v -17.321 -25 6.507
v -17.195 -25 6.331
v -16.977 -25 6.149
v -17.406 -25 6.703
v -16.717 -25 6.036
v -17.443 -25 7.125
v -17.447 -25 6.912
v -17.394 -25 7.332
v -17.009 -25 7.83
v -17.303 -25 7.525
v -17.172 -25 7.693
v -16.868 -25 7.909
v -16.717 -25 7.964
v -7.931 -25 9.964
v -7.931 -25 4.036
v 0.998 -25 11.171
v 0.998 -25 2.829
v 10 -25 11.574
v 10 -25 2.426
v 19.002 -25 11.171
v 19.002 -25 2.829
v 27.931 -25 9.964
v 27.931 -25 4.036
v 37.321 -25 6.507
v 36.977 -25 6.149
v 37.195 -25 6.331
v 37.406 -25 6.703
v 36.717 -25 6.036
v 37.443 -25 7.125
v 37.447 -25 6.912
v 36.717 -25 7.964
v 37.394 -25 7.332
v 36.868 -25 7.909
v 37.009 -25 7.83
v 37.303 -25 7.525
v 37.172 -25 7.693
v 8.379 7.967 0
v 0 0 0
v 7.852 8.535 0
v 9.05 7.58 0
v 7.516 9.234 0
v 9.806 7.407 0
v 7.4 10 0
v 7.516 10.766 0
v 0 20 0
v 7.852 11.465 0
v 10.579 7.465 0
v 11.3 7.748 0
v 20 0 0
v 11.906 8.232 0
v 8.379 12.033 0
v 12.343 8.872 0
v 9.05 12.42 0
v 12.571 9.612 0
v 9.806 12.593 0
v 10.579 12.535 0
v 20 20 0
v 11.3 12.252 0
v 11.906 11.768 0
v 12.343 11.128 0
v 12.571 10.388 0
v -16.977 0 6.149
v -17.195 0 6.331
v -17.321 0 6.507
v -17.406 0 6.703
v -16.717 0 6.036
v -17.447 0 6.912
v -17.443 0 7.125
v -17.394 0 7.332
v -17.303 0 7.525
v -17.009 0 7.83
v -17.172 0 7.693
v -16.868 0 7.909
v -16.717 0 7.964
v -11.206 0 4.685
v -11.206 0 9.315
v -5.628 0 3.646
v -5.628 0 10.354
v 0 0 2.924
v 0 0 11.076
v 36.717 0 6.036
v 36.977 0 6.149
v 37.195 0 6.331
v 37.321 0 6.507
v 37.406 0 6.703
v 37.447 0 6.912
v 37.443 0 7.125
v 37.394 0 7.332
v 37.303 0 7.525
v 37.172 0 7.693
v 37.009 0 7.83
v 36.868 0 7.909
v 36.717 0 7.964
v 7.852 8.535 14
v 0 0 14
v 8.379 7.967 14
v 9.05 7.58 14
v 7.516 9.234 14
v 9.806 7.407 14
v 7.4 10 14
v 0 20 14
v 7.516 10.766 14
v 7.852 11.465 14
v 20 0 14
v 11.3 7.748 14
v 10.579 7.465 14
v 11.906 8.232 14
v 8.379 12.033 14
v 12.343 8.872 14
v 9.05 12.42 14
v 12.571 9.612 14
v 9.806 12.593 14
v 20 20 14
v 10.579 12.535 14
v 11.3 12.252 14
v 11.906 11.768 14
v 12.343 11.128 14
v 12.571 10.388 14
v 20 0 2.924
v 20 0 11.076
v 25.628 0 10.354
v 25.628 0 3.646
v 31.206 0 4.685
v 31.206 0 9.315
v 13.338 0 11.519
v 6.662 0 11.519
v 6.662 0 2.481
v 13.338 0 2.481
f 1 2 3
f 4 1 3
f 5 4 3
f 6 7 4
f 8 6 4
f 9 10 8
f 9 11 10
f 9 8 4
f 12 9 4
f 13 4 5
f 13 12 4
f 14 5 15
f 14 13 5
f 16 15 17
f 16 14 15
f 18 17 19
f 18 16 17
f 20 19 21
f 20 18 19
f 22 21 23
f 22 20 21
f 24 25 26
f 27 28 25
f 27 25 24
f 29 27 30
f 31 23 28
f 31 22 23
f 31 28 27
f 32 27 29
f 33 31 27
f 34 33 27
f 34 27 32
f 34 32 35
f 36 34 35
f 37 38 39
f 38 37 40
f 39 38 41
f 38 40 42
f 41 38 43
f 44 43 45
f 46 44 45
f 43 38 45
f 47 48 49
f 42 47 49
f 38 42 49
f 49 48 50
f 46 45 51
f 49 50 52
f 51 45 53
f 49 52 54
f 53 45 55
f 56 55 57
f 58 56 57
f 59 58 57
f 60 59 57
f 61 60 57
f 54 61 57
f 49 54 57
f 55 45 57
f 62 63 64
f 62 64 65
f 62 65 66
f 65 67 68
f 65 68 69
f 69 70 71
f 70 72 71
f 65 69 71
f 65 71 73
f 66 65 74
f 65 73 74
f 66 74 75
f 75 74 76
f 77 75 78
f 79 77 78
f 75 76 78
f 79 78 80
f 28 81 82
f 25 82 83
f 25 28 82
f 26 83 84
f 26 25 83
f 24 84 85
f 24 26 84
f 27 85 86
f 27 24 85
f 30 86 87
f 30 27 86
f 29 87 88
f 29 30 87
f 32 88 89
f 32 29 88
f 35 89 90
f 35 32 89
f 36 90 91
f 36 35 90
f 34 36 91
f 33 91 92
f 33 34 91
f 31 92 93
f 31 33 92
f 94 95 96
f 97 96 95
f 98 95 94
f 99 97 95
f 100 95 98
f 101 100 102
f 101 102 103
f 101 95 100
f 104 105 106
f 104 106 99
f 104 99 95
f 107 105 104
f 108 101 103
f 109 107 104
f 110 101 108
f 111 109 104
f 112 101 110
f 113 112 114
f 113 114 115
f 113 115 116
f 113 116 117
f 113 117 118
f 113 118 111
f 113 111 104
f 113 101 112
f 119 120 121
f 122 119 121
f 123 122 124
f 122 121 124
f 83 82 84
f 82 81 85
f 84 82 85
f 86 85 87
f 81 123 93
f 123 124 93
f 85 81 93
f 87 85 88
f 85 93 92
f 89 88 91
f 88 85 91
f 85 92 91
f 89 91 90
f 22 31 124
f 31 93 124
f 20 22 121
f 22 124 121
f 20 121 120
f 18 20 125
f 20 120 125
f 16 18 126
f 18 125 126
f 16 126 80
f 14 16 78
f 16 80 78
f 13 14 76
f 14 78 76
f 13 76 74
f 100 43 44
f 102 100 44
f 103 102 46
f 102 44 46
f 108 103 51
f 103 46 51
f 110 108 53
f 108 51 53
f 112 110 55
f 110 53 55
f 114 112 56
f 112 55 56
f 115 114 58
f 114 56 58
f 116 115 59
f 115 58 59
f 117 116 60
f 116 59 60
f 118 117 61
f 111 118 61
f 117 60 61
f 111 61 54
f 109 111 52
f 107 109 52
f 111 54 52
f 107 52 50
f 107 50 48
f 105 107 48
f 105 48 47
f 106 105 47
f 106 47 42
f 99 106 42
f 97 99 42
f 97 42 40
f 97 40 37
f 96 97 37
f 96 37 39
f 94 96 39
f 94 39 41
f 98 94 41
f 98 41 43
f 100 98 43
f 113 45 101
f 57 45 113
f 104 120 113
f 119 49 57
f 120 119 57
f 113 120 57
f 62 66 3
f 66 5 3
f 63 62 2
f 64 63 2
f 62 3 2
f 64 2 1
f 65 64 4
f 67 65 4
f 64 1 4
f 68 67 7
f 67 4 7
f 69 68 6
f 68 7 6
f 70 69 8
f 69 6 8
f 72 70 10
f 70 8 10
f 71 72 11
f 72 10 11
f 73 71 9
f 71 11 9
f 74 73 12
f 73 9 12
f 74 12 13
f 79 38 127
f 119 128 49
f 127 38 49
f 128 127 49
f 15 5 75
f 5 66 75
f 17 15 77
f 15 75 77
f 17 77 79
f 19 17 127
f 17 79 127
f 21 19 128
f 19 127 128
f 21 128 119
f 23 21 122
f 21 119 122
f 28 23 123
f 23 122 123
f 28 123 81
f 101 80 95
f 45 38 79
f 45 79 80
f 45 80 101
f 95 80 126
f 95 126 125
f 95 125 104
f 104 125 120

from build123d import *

# Parameters (mm, degrees)
F0_W     = 20
F0_H     = 20
F1_DEPTH = 14
F3_DEPTH = 25
F5_D     = 5.2
F6_R     = 1
F7_R     = 1


with BuildPart() as f1:
    # F0 (on Top) → F1 (new body)
    with BuildSketch(Plane.XY):
        with Locations((10, 10)):
            Rectangle(F0_W, F0_H)
    extrude(amount=F1_DEPTH)

    # F2 (on Front) → F3 (join)
    with BuildSketch(Plane.XZ):
        with BuildLine():
            ThreePointArc((-20, 7), (10, 2.4258640188), (40, 7))
            ThreePointArc((40, 7), (10, 11.5741359812), (-20, 7))
        make_face()
    extrude(amount=F3_DEPTH)

    # F5 (through all)
    with Locations(Plane.XY.offset(14)):
        with Locations((10, 10)):
            Hole(F5_D / 2)

    # F6
    f6_edges = [f1.edges().sort_by_distance(p)[0] for p in [
        (40, -12.5, 7),
    ]]
    fillet(f6_edges, radius=F6_R)

    # F7
    f7_edges = [f1.edges().sort_by_distance(p)[0] for p in [
        (-20, -12.5, 7),
    ]]
    fillet(f7_edges, radius=F7_R)


solid = f1.part
